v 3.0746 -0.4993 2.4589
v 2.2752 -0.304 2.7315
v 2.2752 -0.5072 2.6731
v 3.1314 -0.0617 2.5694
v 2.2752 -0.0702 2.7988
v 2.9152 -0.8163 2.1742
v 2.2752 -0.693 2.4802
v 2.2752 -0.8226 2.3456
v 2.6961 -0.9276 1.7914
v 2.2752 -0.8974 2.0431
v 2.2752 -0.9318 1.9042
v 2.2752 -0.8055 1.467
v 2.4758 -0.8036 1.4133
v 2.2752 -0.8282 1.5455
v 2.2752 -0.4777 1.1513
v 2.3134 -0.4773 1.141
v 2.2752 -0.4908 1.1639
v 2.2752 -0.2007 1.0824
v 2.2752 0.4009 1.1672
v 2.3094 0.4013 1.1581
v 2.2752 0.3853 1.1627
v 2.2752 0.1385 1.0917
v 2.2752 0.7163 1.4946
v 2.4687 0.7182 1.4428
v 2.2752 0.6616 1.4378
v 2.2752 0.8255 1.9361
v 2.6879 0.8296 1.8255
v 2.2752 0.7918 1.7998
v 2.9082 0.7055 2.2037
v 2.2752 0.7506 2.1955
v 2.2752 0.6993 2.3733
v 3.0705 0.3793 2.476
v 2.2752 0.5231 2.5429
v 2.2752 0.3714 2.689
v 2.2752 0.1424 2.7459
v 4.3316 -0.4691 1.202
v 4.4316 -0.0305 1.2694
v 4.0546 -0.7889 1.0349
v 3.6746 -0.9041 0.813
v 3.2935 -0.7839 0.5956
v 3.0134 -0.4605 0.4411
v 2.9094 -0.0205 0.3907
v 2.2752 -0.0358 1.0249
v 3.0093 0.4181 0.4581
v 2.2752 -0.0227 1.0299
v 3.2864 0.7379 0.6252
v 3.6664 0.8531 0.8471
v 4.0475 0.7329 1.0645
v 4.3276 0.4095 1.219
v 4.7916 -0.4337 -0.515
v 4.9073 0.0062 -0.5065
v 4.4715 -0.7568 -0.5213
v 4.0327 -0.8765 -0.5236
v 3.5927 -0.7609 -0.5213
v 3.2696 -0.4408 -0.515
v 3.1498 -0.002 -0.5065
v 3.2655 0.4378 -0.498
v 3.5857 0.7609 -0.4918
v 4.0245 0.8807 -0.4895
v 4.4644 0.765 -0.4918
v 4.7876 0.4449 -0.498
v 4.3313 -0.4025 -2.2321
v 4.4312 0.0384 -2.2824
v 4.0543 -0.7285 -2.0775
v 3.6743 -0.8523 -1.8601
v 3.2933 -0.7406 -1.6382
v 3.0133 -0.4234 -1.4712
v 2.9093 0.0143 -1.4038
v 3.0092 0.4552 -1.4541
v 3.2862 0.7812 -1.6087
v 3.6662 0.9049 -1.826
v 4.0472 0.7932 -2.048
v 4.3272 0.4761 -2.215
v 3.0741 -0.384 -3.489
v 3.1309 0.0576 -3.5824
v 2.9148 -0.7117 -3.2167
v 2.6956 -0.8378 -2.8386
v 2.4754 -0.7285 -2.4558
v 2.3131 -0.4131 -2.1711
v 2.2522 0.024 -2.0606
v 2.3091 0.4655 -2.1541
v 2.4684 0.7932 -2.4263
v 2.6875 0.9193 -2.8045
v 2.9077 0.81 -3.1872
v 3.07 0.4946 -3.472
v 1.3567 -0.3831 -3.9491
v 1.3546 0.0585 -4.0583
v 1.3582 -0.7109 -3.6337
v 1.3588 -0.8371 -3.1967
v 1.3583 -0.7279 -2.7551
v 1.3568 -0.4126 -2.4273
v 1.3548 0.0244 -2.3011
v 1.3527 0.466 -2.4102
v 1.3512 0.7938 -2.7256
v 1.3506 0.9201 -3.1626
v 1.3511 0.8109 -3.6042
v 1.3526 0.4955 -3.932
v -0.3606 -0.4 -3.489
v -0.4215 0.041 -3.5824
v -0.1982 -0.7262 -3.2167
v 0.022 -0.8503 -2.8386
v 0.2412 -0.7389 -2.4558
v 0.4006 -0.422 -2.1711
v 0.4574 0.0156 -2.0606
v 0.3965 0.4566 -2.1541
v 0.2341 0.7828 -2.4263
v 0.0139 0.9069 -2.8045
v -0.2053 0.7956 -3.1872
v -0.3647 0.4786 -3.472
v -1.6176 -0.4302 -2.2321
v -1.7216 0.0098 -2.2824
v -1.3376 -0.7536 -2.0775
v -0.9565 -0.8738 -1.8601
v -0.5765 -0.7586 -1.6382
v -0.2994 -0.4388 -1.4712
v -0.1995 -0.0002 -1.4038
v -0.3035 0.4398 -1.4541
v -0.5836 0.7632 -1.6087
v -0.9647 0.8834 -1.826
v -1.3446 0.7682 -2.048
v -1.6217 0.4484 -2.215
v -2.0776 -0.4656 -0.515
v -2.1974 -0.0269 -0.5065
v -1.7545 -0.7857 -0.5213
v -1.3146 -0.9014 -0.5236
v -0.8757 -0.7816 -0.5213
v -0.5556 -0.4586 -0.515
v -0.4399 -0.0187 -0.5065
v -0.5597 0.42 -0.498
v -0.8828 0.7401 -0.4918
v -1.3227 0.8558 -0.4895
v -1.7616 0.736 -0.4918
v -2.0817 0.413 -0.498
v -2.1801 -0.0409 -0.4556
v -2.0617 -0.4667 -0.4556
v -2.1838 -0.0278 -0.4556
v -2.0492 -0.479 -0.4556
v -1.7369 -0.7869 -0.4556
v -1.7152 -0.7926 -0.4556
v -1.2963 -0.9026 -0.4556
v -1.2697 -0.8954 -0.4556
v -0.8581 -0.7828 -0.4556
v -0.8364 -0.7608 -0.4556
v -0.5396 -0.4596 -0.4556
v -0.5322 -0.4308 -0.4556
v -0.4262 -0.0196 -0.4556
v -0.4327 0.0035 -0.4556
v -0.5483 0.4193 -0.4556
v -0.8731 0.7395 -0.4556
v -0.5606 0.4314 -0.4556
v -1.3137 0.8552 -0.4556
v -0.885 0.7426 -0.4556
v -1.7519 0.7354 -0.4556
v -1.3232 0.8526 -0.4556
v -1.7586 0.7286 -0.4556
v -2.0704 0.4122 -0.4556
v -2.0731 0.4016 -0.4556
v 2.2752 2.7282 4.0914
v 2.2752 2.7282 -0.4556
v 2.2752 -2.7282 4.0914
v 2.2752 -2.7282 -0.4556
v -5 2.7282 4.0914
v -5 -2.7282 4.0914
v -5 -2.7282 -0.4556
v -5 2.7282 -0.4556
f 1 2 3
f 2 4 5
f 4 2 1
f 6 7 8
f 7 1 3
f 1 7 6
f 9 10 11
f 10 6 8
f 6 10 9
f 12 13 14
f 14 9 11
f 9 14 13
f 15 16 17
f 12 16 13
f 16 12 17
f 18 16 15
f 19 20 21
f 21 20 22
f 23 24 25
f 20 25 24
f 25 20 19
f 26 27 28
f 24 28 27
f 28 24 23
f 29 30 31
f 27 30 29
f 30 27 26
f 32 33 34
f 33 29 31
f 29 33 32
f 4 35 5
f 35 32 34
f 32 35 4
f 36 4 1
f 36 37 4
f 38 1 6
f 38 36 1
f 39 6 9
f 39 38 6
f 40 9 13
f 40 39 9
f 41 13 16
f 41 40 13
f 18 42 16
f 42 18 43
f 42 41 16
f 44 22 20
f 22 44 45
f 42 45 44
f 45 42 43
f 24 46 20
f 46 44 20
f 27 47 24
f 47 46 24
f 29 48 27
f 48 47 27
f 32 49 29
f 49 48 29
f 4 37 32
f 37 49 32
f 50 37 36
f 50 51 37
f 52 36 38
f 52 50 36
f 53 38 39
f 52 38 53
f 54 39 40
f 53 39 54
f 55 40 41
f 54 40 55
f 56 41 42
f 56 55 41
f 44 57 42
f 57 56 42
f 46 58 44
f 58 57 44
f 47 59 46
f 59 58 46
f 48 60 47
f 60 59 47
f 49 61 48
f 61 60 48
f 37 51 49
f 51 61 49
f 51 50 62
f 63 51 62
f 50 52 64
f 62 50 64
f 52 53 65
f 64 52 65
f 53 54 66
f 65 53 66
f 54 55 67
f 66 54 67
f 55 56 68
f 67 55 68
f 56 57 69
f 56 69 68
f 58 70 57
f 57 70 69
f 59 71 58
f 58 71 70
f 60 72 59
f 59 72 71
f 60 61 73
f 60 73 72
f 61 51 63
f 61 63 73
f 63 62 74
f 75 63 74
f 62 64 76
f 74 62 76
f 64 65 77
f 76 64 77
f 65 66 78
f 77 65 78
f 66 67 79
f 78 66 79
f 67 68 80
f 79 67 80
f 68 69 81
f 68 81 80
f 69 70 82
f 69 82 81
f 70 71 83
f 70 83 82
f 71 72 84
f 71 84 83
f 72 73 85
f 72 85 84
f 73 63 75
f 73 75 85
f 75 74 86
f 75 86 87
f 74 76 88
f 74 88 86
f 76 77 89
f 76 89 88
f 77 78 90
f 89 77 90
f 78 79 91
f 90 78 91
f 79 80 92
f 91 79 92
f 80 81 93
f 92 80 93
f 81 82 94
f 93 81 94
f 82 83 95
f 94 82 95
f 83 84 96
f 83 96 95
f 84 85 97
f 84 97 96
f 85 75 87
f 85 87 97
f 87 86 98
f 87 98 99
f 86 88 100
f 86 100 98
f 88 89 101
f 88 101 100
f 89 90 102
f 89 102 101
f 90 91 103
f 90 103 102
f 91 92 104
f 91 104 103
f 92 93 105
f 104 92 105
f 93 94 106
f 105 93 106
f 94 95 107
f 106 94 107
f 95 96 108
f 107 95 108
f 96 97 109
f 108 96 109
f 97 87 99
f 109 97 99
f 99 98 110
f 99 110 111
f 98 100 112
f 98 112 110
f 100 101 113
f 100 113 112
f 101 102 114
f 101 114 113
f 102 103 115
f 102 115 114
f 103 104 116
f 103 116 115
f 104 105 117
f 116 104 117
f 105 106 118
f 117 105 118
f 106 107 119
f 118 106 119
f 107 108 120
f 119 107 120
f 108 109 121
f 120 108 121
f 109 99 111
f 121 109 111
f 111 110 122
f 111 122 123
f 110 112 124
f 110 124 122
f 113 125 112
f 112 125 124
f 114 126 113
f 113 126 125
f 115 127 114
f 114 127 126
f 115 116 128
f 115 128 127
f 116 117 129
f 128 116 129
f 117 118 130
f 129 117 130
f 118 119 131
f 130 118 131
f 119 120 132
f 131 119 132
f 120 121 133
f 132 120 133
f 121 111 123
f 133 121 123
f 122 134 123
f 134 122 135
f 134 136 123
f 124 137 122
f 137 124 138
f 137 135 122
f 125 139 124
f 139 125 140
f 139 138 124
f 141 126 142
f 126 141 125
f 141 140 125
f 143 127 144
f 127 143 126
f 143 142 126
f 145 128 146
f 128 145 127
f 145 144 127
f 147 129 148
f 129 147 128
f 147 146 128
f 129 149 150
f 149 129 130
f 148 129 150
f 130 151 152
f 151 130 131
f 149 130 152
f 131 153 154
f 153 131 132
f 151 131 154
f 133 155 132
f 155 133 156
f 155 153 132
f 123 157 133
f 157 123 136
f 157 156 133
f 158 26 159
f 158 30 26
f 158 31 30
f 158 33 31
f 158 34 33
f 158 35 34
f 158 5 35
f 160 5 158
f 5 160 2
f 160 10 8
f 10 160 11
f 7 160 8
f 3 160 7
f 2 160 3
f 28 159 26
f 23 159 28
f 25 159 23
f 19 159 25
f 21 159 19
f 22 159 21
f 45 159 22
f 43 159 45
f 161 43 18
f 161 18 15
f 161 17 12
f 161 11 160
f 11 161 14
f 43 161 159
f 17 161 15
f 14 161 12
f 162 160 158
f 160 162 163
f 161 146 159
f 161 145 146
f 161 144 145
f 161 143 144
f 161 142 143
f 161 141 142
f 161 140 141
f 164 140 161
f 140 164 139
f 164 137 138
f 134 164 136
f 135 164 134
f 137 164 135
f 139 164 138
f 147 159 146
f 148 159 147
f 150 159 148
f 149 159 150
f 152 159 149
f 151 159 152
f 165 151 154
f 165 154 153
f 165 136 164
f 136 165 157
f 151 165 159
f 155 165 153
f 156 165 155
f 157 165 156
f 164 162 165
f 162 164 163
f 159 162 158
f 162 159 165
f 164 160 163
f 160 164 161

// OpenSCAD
intersection() {
translate([-6.000000, -3.273852, -4.909692])
cube(size = [12.000000, 6.547704, 9.819384], center = false);
union() {
// Begin.
union() {
translate([1.35496, -0.01036, -0.50652])
rotate([0, 1.11102, -89.7335])
rotate([0, 90, 0])
rotate_extrude($fn = 12)
translate([2.67364, 0, 0])
circle(r = 0.87877, $fn = 12);

rotate([0, -0, 0])
translate([-1.36239, 0, 1.8179])
cube(size = [7.27523, 5.45642, 4.54702], center = true);
}
// End.
}
}
